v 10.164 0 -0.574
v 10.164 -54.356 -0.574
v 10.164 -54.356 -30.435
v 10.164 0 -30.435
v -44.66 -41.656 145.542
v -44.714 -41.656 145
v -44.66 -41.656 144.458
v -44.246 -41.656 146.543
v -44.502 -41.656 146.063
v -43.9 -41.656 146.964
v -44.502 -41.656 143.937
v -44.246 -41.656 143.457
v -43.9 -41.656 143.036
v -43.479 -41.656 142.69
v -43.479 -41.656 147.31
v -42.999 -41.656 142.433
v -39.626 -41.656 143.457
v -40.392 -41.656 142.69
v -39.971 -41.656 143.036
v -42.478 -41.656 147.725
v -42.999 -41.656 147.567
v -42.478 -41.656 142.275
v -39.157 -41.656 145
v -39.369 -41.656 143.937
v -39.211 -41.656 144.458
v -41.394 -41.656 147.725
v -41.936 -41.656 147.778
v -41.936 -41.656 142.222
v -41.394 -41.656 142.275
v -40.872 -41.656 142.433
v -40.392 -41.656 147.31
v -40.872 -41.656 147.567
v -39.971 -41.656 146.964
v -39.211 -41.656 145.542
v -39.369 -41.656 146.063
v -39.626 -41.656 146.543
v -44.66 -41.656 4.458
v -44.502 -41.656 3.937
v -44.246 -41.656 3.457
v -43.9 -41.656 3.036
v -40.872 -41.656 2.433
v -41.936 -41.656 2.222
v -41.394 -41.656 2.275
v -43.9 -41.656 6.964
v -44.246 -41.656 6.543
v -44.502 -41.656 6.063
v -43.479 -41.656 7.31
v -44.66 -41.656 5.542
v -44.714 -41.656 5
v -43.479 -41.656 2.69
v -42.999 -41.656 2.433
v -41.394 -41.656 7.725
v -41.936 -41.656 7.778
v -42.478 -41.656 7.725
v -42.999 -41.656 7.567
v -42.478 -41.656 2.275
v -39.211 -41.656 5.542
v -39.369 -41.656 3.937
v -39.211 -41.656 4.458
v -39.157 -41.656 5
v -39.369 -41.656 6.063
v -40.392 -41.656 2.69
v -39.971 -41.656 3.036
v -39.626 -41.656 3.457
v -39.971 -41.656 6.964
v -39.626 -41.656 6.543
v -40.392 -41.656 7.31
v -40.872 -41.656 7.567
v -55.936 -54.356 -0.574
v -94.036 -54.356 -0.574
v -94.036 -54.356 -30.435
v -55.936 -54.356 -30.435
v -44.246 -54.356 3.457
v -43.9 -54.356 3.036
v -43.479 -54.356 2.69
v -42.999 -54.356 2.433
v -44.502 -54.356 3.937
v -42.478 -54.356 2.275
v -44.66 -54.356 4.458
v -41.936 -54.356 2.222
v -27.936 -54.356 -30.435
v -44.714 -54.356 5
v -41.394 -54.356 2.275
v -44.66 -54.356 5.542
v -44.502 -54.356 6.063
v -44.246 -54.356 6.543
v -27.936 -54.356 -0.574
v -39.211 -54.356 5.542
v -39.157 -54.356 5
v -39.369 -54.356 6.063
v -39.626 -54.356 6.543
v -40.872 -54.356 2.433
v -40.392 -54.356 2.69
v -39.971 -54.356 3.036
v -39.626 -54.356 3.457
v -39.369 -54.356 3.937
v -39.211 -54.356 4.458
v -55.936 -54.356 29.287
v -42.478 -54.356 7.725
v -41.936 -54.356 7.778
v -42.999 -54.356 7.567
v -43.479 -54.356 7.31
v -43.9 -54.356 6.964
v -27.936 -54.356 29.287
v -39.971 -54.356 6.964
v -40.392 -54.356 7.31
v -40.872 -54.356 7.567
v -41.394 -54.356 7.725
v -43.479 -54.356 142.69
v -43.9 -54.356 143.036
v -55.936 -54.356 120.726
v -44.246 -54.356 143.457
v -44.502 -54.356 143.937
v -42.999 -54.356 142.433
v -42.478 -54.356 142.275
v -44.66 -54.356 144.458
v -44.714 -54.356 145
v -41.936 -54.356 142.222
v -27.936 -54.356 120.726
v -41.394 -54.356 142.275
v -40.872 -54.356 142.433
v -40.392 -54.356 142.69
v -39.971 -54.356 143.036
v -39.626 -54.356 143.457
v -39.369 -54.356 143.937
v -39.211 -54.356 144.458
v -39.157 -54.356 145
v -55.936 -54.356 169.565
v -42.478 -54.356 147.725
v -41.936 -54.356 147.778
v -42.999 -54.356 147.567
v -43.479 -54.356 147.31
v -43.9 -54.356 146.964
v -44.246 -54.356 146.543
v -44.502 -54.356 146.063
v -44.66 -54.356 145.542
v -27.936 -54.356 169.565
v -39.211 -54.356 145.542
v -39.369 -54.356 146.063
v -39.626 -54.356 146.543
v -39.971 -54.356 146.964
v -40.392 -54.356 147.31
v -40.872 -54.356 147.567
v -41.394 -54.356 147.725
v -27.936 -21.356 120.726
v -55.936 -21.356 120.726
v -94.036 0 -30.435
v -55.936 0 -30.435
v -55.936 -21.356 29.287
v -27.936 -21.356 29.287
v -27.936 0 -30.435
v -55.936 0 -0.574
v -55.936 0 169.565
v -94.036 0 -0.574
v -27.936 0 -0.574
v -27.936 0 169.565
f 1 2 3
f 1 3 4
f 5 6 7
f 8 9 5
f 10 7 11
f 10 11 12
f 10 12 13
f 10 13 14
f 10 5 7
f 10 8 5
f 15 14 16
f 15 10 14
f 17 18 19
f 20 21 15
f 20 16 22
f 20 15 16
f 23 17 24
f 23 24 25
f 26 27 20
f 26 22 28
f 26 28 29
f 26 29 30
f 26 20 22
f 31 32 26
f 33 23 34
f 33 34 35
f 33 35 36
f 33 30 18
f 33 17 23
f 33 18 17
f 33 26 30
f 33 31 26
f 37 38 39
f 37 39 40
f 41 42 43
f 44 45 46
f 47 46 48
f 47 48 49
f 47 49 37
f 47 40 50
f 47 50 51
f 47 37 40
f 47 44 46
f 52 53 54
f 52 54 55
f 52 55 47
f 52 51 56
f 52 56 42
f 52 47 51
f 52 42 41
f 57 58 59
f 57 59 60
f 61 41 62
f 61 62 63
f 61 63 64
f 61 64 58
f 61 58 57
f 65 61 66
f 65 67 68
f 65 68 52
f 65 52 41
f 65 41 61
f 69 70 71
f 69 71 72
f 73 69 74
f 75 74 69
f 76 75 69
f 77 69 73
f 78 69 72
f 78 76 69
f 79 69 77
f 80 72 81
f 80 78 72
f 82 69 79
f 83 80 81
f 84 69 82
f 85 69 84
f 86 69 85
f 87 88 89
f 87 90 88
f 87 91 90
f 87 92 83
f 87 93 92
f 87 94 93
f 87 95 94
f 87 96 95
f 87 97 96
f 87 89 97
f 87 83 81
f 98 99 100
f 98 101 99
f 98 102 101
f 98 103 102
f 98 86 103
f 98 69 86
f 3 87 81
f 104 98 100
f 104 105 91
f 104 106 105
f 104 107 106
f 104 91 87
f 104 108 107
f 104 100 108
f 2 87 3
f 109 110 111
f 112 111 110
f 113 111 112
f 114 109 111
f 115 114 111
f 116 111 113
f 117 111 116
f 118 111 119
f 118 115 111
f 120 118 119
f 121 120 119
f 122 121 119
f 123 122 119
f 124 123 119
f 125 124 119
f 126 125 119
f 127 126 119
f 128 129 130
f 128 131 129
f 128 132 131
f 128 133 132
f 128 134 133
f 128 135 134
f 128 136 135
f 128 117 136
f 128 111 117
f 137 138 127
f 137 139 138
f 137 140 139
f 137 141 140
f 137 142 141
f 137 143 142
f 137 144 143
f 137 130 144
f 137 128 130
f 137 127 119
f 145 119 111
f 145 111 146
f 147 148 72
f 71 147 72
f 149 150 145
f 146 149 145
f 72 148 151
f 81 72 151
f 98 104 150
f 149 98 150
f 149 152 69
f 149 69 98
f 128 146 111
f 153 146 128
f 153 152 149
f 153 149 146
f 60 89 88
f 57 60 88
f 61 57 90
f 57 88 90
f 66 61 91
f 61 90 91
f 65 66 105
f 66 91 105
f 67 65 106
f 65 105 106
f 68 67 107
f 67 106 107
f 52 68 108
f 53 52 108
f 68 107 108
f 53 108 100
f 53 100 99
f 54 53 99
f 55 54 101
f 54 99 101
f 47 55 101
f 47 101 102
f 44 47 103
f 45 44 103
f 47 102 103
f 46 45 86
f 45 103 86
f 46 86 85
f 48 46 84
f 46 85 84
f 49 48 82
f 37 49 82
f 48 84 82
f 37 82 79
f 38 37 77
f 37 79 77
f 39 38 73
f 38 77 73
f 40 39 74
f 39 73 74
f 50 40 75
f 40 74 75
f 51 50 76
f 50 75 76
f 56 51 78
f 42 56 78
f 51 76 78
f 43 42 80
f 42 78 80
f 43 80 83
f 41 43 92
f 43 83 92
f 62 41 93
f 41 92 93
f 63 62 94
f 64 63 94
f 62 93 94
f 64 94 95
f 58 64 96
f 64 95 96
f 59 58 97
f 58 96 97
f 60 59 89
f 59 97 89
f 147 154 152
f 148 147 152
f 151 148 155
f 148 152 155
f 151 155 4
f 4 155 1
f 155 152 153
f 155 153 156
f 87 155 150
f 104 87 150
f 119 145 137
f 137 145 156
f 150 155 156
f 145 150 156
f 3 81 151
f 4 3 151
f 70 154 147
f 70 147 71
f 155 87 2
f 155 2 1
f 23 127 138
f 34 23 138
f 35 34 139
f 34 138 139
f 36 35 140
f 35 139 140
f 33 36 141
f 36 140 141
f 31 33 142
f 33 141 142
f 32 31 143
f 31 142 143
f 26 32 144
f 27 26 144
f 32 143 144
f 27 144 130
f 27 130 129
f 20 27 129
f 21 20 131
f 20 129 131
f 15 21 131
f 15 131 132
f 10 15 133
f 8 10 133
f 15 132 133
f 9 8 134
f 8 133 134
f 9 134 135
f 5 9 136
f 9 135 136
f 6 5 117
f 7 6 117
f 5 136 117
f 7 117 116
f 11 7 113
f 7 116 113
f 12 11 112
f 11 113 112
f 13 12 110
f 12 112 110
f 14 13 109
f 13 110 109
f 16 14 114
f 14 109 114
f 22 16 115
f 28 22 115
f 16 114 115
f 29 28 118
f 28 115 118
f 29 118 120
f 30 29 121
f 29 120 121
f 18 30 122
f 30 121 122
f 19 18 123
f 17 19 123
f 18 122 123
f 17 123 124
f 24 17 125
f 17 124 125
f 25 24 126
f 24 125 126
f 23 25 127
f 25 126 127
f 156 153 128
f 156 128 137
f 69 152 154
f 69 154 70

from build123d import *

# Parameters (mm, degrees)
F0_W      = 28
F0_H      = 200
F1_DEPTH  = 54.356
F3_W      = 27.69987
F3_H      = 91.44
F4_DEPTH  = 33
F4_FACE_W = 33
F4_FACE_H = 91.44
F5_DEPTH  = 25.4
F6_R      = 2.778125
F7_DEPTH  = 12.7
F8_W      = 54.356
F8_H      = 29.860789
F9_DEPTH  = 38.1
F10_W     = 54.356
F10_H     = 29.860789
F11_DEPTH = 38.1


with BuildPart() as f1:
    # F0 (on Front) → F1 (new body)
    with BuildSketch(Plane.XZ):
        with Locations((-41.935609, 69.564922)):
            Rectangle(F0_W, F0_H)
    extrude(amount=F1_DEPTH)

    # F3 (on face) → F4 (cut)
    with BuildSketch(Plane.XZ.offset(54.356)):
        with Locations((-41.785544, 75.0065)):
            Rectangle(F3_W, F3_H)
    extrude(amount=-F4_DEPTH, mode=Mode.SUBTRACT)

    # F4_face (on face) → F5 (cut)
    with BuildSketch(Plane(origin=(-55.635479, -37.856, 75.0065), x_dir=(0, 1, 0), z_dir=(1, 0, 0))):
        Rectangle(F4_FACE_W, F4_FACE_H)
    extrude(amount=-F5_DEPTH, mode=Mode.SUBTRACT)

    # F6 (on face) → F7 (cut)
    with BuildSketch(Plane.XZ.offset(54.356)):
        with Locations((-41.935609, 145)):
            Circle(F6_R)
        with Locations((-41.935609, 5)):
            Circle(F6_R)
    extrude(amount=-F7_DEPTH, mode=Mode.SUBTRACT)

    # F8 (on face) → F9 (join)
    with BuildSketch(Plane.YZ.offset(-27.935609)):
        with Locations((-27.178, -15.504683)):
            Rectangle(F8_W, F8_H)
    extrude(amount=F9_DEPTH)

    # F10 (on face) → F11 (join)
    with BuildSketch(Plane(origin=(-55.935609, 0, 0), x_dir=(0, -1, 0), z_dir=(-1, 0, 0))):
        with Locations((27.178, -15.504683)):
            Rectangle(F10_W, F10_H)
    extrude(amount=F11_DEPTH)


solid = f1.part
